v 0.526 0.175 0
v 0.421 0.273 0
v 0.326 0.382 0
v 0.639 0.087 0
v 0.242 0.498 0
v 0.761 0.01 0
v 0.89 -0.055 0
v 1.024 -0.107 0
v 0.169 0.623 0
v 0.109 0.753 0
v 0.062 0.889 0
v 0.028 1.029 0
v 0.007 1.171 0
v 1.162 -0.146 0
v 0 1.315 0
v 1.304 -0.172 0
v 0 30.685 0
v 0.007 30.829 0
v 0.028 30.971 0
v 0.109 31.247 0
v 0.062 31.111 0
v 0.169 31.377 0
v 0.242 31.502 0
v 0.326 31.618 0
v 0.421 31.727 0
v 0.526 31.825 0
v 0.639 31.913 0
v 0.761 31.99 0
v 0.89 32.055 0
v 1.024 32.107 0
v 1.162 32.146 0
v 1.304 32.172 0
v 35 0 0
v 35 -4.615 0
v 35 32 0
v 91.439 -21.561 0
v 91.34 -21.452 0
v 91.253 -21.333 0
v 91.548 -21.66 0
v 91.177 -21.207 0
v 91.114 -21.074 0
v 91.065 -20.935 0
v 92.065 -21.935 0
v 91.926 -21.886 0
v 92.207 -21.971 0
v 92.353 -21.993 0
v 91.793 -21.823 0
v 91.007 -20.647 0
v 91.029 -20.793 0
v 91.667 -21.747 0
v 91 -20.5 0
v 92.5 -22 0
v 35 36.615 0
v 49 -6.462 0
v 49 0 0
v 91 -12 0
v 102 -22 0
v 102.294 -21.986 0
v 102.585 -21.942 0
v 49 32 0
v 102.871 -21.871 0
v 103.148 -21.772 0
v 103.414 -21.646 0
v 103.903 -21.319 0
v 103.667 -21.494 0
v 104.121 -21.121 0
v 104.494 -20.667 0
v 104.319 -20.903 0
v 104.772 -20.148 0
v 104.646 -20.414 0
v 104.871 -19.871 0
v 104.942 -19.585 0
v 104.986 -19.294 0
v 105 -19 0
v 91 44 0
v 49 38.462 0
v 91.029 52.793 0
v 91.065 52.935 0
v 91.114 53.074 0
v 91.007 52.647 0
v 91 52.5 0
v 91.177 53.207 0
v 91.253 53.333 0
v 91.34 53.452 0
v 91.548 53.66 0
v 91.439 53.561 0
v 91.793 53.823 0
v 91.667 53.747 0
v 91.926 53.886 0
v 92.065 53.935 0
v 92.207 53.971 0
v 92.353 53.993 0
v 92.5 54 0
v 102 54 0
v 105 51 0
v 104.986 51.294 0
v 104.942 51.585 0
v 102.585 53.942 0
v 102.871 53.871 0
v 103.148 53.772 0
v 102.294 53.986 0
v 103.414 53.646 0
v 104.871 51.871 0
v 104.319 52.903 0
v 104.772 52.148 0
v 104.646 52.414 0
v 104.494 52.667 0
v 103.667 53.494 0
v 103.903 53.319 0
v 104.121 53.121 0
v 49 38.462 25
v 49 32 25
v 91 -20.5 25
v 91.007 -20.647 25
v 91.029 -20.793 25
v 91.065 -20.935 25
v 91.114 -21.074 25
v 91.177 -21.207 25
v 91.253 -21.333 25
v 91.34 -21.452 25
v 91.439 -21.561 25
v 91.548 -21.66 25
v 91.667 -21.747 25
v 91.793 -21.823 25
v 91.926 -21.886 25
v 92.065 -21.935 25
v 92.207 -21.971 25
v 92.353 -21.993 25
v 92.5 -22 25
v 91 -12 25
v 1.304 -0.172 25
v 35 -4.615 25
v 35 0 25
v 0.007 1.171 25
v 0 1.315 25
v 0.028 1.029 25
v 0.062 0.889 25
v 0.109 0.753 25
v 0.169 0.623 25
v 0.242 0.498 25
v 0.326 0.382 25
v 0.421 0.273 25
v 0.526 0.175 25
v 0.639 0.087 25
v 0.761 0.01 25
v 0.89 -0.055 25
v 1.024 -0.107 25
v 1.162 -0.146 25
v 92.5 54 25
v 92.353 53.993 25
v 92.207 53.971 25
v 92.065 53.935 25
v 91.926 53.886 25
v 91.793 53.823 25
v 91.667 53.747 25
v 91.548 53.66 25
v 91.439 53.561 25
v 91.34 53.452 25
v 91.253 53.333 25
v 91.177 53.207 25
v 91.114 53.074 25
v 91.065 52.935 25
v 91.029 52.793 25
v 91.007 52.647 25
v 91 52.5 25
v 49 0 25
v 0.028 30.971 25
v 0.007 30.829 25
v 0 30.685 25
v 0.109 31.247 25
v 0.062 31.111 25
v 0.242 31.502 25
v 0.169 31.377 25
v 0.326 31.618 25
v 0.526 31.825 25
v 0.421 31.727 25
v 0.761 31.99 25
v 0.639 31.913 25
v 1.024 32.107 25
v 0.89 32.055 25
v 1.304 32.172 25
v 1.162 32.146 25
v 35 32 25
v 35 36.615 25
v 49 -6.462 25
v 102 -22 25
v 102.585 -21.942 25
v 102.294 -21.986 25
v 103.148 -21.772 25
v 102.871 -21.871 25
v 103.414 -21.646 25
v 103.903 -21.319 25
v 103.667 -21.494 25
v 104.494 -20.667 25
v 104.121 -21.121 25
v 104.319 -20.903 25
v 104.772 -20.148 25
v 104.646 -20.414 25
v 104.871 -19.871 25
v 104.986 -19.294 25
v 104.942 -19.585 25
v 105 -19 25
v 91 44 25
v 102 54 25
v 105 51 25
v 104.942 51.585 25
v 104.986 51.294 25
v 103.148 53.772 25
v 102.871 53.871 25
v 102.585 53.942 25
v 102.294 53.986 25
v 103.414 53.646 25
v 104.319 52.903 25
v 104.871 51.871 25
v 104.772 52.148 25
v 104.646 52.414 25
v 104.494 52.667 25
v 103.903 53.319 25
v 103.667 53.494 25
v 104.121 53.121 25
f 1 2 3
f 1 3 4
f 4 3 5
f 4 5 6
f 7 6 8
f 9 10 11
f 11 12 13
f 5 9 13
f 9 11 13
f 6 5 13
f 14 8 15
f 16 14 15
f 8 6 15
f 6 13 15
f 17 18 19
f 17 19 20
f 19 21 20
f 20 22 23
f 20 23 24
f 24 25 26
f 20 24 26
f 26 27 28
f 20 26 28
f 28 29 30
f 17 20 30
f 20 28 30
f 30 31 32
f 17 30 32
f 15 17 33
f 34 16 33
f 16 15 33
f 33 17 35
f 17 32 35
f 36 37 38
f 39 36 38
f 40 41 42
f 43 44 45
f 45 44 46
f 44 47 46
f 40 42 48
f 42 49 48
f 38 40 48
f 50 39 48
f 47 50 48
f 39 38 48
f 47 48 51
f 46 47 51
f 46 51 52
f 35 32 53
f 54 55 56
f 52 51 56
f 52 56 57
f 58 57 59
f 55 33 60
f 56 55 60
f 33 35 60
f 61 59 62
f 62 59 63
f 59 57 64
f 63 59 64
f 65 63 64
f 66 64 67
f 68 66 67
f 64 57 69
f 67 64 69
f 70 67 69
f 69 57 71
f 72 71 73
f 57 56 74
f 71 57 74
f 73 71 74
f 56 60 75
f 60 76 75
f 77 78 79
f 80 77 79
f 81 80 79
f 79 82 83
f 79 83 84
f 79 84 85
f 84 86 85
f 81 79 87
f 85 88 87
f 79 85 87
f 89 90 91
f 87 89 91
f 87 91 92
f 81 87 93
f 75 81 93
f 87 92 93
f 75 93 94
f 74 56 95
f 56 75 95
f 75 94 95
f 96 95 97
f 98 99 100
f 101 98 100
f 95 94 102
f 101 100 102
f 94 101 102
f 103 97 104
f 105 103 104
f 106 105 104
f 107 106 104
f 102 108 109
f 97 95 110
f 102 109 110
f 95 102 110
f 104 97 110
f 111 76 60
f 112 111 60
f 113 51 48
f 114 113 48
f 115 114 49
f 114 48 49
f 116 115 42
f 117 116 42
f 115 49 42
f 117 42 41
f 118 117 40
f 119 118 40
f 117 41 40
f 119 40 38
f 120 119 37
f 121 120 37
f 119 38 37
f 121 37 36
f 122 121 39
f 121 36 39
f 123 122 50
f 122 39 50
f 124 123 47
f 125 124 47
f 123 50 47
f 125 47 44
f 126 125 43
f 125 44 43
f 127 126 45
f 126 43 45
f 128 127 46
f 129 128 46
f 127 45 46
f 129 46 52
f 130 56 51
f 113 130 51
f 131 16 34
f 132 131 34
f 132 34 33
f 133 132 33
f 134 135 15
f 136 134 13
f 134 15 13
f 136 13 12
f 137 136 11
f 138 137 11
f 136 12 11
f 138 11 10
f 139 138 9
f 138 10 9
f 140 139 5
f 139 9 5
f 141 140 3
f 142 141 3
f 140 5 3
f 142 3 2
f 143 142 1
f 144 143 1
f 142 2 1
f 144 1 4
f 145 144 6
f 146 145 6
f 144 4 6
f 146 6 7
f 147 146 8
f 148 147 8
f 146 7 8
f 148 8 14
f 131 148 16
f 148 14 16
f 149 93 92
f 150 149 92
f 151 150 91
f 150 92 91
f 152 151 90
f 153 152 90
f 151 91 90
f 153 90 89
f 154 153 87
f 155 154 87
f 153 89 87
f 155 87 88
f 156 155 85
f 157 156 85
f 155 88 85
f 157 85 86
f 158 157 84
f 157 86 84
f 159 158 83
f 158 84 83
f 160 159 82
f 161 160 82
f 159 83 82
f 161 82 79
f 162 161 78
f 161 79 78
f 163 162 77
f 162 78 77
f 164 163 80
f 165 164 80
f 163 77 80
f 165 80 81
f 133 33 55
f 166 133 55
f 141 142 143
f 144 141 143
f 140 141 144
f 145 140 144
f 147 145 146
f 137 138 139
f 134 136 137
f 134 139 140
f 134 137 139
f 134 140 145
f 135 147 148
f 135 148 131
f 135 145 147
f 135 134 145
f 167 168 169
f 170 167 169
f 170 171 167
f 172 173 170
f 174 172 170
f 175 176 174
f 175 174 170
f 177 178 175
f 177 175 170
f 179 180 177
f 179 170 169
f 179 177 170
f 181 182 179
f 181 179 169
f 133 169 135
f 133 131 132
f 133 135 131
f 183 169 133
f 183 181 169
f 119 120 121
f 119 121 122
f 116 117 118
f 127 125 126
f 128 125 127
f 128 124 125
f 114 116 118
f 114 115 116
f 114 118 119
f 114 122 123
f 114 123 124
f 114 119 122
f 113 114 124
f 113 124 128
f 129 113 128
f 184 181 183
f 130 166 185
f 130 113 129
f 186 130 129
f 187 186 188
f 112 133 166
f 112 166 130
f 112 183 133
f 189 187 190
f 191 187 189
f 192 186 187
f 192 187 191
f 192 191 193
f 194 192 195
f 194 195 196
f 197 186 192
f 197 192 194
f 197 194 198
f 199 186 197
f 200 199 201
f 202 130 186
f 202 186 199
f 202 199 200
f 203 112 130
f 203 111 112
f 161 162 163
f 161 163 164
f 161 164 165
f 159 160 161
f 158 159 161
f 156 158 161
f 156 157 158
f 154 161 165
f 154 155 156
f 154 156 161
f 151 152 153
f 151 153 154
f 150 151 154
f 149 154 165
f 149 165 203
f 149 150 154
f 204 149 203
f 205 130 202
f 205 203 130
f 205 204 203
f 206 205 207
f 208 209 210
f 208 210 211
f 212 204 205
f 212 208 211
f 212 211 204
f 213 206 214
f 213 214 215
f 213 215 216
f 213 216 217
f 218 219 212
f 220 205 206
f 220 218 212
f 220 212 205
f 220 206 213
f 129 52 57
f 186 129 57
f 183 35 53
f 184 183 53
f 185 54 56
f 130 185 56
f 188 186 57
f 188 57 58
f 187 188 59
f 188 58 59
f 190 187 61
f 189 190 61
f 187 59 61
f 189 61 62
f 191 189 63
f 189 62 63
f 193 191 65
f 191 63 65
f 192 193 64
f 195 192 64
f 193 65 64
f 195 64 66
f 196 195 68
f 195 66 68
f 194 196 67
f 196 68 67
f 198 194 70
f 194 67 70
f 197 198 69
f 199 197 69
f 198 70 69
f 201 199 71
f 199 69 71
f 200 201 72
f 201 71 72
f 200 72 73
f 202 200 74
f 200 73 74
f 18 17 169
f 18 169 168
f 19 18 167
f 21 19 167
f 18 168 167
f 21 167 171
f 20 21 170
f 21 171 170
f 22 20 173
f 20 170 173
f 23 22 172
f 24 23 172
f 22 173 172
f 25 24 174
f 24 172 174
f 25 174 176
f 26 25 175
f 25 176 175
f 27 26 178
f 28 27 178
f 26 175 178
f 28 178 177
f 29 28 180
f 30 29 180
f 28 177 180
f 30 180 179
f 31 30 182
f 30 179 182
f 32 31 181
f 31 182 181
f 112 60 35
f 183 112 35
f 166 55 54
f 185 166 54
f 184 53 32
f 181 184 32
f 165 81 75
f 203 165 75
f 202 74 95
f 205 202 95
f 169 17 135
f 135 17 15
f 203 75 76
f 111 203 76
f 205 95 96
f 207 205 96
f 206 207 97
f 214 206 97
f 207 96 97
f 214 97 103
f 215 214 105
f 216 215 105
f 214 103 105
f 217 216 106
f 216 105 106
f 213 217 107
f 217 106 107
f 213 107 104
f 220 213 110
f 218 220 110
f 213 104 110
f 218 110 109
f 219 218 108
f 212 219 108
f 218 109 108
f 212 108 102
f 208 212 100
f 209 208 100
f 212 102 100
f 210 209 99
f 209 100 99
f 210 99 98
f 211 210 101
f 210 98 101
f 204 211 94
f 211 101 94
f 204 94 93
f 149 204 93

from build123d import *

# Parameters (mm, degrees)
F1_DEPTH = 25
F2_R     = 1.5


with BuildPart() as f1:
    # F0 (on Top) → F1 (new body)
    with BuildSketch(Plane.XY):
        with BuildLine():
            Line((0, 32), (0, 1.5))
            Line((0, 1.5), (0, 1.315183))
            ThreePointArc((0, 1.315183), (0.372135, 0.326284), (1.303896, -0.171942))
            Line((1.303896, -0.171942), (35, -4.615385))
            Line((35, -4.615385), (35, 0))
            Line((35, 0), (49, 0))
            Line((49, 0), (49, -6.461538))
            Line((49, -6.461538), (91, -12))
            Line((91, -12), (91, -20.5))
            ThreePointArc((91, -20.5), (91.43934, -21.56066), (92.5, -22))
            Line((92.5, -22), (102, -22))
            ThreePointArc((102, -22), (104.12132, -21.12132), (105, -19))
            Line((105, -19), (105, 0))
            Line((105, 0), (105, 1.5))
            Line((105, 1.5), (105, 51))
            ThreePointArc((105, 51), (104.12132, 53.12132), (102, 54))
            Line((102, 54), (92.5, 54))
            ThreePointArc((92.5, 54), (91.43934, 53.56066), (91, 52.5))
            Line((91, 52.5), (91, 44))
            Line((91, 44), (49, 38.461538))
            Line((49, 38.461538), (49, 32))
            Line((49, 32), (35, 32))
            Line((35, 32), (35, 36.615385))
            Line((35, 36.615385), (0, 32))
        make_face()
    extrude(amount=F1_DEPTH)

    # F2
    f2_edges = [f1.edges().sort_by_distance(p)[0] for p in [
        (0, 32, 12.5),
    ]]
    fillet(f2_edges, radius=F2_R)


solid = f1.part
